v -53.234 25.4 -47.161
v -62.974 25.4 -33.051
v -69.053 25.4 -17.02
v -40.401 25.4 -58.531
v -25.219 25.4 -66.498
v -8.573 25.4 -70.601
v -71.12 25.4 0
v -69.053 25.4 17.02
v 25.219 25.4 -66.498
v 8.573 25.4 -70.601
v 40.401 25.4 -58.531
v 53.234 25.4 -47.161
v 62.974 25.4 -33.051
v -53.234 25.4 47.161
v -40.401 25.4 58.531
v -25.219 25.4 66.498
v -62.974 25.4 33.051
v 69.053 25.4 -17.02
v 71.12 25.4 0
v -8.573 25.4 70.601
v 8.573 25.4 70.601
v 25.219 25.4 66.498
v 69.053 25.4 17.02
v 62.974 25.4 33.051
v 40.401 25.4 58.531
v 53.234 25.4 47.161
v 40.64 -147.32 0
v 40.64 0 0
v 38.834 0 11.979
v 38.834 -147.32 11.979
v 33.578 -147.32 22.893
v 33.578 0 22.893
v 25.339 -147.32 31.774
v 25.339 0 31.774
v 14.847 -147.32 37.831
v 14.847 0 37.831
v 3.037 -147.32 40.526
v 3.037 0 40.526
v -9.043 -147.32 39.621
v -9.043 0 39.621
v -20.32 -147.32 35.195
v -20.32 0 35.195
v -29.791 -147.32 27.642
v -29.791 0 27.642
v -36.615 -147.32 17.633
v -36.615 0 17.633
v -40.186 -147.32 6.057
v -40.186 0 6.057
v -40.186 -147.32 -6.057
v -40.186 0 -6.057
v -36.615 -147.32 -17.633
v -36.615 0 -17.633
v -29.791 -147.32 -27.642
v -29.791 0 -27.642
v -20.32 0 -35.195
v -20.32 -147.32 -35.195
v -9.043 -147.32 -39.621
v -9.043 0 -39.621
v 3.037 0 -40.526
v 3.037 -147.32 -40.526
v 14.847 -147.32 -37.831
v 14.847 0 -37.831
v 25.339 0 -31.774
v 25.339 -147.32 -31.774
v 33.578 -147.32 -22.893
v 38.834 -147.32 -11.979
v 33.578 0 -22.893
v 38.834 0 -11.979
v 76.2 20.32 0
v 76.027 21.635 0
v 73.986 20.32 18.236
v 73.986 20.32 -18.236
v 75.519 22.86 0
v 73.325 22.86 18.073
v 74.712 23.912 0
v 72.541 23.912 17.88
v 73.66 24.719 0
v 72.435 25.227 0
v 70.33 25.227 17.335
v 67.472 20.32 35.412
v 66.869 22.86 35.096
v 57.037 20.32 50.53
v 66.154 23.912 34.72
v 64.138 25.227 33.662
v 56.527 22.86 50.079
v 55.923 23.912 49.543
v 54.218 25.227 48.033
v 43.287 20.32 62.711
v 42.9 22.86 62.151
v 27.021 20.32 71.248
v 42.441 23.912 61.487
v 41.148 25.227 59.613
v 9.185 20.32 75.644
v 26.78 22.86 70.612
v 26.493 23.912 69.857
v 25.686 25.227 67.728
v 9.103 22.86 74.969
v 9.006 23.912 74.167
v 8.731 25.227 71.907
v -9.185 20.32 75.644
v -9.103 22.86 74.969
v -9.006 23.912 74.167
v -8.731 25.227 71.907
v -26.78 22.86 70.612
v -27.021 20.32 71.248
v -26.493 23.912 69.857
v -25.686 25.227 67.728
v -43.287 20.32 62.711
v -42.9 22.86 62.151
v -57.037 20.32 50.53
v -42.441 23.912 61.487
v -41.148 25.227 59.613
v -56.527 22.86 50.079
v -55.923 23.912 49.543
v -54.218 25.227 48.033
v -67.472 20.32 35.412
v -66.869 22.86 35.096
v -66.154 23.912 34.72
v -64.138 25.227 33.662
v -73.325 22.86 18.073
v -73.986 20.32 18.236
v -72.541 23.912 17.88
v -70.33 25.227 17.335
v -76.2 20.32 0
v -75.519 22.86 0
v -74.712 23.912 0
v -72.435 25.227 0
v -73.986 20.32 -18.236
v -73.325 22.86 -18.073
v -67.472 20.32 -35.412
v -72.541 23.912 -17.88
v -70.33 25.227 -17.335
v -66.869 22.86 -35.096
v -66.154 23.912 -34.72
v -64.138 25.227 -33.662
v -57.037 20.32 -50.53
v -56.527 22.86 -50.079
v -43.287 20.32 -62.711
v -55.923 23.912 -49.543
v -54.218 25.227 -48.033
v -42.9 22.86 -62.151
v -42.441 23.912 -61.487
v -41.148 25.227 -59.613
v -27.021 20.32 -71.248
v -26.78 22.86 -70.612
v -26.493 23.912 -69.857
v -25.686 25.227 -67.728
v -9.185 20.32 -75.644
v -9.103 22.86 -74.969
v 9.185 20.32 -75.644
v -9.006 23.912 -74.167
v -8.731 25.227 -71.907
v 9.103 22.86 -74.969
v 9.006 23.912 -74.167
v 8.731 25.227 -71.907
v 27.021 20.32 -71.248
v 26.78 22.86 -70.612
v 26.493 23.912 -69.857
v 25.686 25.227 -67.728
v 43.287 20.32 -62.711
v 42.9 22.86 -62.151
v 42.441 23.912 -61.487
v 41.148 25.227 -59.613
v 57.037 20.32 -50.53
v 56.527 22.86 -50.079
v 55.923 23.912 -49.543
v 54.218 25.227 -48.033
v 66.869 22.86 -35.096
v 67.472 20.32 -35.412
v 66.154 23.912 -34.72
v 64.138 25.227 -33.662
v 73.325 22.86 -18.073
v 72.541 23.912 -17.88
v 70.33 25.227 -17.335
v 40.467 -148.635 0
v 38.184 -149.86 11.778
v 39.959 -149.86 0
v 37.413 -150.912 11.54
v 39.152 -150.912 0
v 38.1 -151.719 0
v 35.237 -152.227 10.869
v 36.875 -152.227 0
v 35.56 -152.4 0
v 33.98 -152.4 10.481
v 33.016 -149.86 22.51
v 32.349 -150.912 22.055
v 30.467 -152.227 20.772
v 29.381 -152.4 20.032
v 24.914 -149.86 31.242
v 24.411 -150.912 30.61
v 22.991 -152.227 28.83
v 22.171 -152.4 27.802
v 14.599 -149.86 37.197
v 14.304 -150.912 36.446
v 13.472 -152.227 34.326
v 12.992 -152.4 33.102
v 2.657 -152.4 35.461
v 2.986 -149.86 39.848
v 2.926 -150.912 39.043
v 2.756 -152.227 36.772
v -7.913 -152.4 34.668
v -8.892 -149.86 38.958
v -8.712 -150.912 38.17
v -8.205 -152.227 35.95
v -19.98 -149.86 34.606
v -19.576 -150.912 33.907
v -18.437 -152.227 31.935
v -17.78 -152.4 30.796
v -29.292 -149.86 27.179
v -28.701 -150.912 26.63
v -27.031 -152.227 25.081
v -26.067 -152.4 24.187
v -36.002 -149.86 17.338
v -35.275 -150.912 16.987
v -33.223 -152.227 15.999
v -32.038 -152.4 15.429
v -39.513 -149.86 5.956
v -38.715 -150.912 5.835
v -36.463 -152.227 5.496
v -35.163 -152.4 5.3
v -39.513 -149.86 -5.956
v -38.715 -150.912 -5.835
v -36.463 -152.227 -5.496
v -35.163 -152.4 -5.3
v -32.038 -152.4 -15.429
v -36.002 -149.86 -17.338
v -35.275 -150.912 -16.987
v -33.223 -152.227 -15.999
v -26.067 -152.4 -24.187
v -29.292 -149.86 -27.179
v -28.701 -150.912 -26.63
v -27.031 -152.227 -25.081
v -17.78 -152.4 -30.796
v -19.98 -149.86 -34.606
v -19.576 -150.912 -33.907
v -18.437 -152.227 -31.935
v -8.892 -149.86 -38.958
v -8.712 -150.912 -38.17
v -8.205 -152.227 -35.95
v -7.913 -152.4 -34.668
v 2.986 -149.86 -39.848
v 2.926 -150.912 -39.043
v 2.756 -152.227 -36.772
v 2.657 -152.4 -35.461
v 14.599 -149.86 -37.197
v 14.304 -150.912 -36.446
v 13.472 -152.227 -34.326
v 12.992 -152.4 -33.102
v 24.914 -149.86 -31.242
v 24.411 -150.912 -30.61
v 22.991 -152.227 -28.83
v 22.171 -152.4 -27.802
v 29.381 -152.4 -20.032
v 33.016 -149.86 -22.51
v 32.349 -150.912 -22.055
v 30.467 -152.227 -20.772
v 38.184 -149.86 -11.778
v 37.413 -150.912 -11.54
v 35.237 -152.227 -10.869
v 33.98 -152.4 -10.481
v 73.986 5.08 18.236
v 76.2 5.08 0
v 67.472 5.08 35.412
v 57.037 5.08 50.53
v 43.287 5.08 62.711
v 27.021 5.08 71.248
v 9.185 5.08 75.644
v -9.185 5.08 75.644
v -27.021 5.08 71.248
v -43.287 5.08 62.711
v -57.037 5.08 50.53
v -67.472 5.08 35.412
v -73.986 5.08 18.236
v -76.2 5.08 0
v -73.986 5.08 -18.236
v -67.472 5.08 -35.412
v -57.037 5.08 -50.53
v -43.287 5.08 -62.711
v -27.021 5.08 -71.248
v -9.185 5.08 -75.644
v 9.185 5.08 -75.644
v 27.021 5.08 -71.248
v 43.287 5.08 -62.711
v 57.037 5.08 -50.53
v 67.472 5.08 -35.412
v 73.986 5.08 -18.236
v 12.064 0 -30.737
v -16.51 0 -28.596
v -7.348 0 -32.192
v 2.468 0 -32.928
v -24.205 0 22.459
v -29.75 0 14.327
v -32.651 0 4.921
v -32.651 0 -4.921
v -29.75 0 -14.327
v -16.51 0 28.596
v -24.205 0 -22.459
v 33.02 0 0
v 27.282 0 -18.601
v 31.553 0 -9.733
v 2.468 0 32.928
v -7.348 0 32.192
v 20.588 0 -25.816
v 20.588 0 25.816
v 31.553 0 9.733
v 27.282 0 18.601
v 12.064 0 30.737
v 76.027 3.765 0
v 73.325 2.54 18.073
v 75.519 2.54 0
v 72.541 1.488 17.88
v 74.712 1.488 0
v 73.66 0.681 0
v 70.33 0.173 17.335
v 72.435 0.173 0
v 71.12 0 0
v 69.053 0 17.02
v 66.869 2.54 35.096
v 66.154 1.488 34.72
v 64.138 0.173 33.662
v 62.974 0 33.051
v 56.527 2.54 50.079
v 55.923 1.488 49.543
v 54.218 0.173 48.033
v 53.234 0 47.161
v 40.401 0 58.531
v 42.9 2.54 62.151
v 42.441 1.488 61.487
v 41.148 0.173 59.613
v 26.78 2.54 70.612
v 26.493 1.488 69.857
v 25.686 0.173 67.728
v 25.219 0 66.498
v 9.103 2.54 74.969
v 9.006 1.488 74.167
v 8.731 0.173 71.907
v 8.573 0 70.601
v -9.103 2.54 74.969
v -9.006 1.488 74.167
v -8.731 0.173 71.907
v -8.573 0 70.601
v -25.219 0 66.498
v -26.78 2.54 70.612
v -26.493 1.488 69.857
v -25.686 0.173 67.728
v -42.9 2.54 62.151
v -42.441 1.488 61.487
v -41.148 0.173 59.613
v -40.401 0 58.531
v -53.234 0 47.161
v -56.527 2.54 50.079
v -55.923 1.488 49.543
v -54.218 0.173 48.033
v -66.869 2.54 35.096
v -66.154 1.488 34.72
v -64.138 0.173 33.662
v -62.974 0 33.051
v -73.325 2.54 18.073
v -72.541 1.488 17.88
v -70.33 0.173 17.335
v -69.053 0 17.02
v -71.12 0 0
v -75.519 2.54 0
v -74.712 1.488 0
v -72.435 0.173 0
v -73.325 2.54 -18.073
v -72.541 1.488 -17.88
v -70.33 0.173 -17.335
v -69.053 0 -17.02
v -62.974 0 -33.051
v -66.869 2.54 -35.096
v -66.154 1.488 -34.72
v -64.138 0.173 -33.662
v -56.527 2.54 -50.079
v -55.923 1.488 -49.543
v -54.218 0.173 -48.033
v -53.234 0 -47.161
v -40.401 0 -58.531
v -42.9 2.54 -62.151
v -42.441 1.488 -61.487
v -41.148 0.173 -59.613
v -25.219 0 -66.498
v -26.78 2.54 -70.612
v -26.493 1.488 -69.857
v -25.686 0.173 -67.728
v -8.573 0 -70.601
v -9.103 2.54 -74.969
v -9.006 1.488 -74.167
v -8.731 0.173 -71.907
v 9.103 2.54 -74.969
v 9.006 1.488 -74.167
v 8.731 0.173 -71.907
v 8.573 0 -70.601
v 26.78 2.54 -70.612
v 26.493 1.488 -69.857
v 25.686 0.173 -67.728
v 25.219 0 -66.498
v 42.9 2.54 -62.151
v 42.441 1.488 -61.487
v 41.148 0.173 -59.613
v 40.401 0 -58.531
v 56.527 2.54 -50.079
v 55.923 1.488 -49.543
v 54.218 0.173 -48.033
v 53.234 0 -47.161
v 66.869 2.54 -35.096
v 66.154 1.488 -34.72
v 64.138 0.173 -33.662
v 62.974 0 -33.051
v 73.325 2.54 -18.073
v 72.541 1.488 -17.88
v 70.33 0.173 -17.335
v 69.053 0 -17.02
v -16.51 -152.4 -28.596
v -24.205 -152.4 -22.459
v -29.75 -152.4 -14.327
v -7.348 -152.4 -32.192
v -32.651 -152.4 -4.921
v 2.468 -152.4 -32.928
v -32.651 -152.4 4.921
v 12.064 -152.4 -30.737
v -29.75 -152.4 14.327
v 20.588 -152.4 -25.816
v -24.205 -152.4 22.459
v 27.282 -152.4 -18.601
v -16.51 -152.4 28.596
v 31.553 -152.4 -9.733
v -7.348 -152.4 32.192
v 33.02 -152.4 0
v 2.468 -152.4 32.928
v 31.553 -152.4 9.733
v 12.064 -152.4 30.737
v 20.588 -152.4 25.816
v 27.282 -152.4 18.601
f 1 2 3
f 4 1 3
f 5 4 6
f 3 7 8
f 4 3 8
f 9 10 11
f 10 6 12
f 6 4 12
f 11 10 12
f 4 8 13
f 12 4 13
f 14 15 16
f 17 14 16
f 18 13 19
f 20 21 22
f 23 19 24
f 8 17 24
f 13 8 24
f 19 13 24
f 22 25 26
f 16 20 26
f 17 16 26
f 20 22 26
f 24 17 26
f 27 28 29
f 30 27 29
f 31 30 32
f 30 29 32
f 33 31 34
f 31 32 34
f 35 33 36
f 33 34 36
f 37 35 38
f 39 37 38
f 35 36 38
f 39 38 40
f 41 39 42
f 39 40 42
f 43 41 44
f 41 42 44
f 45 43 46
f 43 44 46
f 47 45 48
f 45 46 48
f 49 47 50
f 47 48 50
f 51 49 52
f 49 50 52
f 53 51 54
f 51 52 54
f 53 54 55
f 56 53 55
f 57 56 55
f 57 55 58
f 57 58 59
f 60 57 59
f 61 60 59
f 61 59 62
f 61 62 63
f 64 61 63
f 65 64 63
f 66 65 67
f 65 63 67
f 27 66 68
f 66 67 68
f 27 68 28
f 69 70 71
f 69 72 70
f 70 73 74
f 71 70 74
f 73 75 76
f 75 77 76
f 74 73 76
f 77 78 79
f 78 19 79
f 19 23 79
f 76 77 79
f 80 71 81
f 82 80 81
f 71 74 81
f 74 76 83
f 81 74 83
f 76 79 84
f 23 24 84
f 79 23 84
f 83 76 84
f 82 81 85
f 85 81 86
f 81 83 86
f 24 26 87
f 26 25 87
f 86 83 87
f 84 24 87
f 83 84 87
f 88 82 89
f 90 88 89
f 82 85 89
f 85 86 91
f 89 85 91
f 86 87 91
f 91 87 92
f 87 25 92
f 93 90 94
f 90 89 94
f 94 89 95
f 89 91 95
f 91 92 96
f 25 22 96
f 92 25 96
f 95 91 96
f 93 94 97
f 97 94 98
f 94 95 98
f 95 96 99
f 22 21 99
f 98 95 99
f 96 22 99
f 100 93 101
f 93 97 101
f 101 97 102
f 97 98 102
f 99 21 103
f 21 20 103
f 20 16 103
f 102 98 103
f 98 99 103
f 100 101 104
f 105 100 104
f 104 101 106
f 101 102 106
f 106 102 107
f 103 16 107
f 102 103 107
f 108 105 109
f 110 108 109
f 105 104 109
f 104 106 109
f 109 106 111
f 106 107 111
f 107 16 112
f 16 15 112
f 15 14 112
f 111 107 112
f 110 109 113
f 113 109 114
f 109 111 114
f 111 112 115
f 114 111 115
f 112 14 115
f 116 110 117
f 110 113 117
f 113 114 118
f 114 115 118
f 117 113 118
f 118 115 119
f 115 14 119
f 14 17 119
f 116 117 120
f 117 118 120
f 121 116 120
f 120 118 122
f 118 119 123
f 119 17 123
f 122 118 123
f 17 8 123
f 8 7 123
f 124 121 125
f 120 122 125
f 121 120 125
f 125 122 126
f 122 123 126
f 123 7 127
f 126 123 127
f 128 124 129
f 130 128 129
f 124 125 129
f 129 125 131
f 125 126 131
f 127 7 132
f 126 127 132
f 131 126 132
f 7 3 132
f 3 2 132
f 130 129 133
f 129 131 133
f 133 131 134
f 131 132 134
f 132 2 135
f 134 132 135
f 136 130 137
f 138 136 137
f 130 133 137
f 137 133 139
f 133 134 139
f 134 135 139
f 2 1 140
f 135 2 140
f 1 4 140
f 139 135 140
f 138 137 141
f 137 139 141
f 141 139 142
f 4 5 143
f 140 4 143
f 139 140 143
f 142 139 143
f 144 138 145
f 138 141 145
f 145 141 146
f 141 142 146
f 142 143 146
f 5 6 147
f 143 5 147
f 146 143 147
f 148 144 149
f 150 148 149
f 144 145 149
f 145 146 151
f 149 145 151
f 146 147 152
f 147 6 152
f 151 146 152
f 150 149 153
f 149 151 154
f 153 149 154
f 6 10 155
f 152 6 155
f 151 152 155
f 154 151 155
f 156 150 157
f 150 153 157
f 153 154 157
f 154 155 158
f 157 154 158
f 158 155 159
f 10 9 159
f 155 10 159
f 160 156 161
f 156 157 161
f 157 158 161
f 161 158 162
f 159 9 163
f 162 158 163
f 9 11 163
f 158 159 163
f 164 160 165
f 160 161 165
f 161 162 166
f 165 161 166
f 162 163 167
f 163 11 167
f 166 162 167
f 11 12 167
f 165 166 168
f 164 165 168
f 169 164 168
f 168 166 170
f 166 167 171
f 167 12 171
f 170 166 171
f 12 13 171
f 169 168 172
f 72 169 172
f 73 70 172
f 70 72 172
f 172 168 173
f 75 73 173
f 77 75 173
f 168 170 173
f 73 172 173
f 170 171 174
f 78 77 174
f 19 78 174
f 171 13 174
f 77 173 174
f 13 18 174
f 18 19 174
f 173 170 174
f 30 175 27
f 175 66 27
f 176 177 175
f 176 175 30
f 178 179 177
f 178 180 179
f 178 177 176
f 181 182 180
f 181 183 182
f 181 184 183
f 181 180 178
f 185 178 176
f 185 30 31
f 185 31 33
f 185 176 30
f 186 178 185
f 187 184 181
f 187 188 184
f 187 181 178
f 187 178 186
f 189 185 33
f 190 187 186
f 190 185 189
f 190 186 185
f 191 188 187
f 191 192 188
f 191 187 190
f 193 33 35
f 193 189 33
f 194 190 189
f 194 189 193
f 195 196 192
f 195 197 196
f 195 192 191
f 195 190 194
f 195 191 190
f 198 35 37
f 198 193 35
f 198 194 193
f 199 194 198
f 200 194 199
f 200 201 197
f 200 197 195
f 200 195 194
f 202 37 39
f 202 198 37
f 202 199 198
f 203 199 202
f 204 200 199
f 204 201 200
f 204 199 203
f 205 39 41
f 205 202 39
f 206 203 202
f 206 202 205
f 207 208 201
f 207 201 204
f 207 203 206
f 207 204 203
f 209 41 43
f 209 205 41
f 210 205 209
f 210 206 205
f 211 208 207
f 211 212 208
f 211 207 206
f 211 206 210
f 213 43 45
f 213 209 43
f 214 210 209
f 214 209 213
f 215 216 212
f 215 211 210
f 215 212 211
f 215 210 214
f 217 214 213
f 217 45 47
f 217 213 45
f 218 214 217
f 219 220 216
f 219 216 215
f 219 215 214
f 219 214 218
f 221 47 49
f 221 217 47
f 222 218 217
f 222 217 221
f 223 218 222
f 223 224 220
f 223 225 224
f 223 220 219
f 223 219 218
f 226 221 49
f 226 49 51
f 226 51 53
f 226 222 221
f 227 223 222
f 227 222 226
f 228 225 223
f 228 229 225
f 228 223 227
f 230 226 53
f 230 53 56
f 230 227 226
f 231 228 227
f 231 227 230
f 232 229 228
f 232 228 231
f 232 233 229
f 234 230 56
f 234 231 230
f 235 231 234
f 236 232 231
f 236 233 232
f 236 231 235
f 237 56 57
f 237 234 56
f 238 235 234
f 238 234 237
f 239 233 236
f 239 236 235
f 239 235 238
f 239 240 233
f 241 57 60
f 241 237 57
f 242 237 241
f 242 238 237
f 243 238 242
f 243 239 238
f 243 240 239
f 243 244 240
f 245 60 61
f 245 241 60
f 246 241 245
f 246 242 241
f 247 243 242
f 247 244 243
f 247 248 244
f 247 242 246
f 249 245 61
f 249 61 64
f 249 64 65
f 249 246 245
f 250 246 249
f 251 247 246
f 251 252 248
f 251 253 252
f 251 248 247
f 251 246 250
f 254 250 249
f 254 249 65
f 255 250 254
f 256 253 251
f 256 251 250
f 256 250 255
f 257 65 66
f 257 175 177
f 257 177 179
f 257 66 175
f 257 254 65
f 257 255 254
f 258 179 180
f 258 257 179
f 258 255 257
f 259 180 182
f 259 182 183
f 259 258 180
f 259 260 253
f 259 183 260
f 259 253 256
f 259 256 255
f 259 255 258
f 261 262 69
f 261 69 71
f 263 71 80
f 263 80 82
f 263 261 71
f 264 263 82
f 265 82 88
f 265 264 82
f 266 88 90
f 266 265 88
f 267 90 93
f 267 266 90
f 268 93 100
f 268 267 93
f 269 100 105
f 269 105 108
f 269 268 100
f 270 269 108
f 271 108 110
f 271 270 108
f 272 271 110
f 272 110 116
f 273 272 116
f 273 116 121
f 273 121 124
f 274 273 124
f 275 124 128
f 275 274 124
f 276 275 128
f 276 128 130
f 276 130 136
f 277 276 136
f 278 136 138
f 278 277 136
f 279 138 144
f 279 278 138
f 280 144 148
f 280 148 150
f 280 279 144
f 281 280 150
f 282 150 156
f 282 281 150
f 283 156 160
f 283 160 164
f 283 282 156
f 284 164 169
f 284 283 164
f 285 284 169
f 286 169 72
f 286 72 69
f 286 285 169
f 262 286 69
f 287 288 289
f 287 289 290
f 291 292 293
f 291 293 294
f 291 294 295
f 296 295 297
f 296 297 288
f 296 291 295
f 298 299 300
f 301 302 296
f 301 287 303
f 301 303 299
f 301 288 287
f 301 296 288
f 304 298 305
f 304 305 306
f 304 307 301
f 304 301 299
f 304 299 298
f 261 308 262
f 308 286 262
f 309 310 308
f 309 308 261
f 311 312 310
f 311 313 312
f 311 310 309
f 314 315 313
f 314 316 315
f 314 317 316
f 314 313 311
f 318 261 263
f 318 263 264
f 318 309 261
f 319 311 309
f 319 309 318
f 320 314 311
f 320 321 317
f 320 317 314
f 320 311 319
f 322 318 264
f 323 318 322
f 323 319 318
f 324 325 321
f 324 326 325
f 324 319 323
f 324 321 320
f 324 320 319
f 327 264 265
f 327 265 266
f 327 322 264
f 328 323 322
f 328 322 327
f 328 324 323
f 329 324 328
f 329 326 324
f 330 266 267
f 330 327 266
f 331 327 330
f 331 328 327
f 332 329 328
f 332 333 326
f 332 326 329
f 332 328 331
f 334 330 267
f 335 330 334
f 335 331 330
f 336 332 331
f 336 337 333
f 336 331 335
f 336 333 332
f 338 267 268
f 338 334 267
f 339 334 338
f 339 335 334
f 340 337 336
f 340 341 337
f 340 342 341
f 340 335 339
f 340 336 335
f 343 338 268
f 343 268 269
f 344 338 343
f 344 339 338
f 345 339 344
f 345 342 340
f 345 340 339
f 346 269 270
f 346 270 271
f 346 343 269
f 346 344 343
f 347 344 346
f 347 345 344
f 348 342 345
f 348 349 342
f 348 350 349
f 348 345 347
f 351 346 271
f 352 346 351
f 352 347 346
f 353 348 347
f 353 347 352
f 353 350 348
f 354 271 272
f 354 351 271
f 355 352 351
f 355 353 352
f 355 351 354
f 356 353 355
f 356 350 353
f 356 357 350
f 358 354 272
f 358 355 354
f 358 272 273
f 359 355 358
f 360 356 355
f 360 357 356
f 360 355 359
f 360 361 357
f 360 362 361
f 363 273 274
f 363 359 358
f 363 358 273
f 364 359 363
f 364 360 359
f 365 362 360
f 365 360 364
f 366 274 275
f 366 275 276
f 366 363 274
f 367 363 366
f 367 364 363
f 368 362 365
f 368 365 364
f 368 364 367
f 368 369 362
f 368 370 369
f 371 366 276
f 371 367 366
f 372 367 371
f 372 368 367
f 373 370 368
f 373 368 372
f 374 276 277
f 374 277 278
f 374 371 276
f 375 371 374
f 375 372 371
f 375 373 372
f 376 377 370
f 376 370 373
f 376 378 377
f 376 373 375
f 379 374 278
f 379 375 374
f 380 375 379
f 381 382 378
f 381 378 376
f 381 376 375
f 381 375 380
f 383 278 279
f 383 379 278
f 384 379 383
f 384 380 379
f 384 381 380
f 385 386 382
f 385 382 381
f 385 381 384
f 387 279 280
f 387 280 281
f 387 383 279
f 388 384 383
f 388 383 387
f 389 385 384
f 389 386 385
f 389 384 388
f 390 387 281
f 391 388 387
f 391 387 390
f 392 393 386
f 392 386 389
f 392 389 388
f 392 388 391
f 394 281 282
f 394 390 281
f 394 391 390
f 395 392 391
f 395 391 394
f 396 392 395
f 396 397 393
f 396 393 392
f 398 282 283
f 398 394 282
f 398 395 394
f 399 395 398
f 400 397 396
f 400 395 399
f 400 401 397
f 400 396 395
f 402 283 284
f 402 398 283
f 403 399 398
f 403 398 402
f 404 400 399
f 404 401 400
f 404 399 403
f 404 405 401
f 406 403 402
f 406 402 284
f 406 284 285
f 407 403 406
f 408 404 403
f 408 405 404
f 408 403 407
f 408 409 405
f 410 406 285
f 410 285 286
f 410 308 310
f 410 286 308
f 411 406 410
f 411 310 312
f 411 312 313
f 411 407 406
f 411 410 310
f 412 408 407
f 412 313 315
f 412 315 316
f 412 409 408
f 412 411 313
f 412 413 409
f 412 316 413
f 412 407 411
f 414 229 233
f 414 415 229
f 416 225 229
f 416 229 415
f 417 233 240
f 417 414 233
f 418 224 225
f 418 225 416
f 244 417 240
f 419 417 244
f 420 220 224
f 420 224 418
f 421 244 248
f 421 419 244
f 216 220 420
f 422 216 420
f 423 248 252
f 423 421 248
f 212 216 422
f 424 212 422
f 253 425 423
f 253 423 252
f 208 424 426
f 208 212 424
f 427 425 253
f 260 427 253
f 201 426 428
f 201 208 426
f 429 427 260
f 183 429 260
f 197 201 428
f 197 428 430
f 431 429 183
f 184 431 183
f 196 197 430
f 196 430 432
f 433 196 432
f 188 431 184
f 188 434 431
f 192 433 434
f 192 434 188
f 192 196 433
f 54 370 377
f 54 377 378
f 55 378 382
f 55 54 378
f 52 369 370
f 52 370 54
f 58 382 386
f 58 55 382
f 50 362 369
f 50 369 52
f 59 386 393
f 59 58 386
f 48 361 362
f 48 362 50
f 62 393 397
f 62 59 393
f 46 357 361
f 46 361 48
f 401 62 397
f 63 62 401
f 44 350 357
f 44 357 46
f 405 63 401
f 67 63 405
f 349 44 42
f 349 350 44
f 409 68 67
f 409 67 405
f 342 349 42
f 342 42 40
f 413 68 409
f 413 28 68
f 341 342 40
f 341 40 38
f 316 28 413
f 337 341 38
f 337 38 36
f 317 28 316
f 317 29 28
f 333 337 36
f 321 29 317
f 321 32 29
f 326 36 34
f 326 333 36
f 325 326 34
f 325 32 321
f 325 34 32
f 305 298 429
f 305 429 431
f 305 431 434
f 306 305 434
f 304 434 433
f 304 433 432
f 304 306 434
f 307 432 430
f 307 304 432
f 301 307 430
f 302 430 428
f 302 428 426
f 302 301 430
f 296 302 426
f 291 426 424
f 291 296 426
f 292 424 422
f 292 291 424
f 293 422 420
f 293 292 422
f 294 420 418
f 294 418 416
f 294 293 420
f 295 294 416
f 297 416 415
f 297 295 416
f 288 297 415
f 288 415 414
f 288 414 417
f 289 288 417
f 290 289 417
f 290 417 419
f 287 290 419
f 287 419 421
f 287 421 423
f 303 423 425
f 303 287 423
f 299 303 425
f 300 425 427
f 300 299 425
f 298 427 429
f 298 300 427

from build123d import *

# Parameters (mm, degrees)
F0_R     = 40.64
F0_R_2   = 33.02
F1_DEPTH = 152.4
F2_R     = 76.2
F3_DEPTH = 25.4
F4_R     = 5.08
F5_R     = 5.08


with BuildPart() as f1:
    # F0 (on Front) → F1 (new body)
    with BuildSketch(Plane.XZ):
        Circle(F0_R)
        Circle(F0_R_2, mode=Mode.SUBTRACT)
    extrude(amount=F1_DEPTH)

    # F2 (on Front) → F3 (join)
    with BuildSketch(Plane.XZ):
        Circle(F2_R)
    extrude(amount=-F3_DEPTH)

    # F4
    f4_edges = [f1.edges().sort_by_distance(p)[0] for p in [
        (76.2, 12.7, 0),
        (-76.2, 0, 0),
        (-76.2, 25.4, 0),
    ]]
    fillet(f4_edges, radius=F4_R)

    # F5
    f5_edges = [f1.edges().sort_by_distance(p)[0] for p in [
        (-40.64, -152.4, 0),
    ]]
    fillet(f5_edges, radius=F5_R)


solid = f1.part
